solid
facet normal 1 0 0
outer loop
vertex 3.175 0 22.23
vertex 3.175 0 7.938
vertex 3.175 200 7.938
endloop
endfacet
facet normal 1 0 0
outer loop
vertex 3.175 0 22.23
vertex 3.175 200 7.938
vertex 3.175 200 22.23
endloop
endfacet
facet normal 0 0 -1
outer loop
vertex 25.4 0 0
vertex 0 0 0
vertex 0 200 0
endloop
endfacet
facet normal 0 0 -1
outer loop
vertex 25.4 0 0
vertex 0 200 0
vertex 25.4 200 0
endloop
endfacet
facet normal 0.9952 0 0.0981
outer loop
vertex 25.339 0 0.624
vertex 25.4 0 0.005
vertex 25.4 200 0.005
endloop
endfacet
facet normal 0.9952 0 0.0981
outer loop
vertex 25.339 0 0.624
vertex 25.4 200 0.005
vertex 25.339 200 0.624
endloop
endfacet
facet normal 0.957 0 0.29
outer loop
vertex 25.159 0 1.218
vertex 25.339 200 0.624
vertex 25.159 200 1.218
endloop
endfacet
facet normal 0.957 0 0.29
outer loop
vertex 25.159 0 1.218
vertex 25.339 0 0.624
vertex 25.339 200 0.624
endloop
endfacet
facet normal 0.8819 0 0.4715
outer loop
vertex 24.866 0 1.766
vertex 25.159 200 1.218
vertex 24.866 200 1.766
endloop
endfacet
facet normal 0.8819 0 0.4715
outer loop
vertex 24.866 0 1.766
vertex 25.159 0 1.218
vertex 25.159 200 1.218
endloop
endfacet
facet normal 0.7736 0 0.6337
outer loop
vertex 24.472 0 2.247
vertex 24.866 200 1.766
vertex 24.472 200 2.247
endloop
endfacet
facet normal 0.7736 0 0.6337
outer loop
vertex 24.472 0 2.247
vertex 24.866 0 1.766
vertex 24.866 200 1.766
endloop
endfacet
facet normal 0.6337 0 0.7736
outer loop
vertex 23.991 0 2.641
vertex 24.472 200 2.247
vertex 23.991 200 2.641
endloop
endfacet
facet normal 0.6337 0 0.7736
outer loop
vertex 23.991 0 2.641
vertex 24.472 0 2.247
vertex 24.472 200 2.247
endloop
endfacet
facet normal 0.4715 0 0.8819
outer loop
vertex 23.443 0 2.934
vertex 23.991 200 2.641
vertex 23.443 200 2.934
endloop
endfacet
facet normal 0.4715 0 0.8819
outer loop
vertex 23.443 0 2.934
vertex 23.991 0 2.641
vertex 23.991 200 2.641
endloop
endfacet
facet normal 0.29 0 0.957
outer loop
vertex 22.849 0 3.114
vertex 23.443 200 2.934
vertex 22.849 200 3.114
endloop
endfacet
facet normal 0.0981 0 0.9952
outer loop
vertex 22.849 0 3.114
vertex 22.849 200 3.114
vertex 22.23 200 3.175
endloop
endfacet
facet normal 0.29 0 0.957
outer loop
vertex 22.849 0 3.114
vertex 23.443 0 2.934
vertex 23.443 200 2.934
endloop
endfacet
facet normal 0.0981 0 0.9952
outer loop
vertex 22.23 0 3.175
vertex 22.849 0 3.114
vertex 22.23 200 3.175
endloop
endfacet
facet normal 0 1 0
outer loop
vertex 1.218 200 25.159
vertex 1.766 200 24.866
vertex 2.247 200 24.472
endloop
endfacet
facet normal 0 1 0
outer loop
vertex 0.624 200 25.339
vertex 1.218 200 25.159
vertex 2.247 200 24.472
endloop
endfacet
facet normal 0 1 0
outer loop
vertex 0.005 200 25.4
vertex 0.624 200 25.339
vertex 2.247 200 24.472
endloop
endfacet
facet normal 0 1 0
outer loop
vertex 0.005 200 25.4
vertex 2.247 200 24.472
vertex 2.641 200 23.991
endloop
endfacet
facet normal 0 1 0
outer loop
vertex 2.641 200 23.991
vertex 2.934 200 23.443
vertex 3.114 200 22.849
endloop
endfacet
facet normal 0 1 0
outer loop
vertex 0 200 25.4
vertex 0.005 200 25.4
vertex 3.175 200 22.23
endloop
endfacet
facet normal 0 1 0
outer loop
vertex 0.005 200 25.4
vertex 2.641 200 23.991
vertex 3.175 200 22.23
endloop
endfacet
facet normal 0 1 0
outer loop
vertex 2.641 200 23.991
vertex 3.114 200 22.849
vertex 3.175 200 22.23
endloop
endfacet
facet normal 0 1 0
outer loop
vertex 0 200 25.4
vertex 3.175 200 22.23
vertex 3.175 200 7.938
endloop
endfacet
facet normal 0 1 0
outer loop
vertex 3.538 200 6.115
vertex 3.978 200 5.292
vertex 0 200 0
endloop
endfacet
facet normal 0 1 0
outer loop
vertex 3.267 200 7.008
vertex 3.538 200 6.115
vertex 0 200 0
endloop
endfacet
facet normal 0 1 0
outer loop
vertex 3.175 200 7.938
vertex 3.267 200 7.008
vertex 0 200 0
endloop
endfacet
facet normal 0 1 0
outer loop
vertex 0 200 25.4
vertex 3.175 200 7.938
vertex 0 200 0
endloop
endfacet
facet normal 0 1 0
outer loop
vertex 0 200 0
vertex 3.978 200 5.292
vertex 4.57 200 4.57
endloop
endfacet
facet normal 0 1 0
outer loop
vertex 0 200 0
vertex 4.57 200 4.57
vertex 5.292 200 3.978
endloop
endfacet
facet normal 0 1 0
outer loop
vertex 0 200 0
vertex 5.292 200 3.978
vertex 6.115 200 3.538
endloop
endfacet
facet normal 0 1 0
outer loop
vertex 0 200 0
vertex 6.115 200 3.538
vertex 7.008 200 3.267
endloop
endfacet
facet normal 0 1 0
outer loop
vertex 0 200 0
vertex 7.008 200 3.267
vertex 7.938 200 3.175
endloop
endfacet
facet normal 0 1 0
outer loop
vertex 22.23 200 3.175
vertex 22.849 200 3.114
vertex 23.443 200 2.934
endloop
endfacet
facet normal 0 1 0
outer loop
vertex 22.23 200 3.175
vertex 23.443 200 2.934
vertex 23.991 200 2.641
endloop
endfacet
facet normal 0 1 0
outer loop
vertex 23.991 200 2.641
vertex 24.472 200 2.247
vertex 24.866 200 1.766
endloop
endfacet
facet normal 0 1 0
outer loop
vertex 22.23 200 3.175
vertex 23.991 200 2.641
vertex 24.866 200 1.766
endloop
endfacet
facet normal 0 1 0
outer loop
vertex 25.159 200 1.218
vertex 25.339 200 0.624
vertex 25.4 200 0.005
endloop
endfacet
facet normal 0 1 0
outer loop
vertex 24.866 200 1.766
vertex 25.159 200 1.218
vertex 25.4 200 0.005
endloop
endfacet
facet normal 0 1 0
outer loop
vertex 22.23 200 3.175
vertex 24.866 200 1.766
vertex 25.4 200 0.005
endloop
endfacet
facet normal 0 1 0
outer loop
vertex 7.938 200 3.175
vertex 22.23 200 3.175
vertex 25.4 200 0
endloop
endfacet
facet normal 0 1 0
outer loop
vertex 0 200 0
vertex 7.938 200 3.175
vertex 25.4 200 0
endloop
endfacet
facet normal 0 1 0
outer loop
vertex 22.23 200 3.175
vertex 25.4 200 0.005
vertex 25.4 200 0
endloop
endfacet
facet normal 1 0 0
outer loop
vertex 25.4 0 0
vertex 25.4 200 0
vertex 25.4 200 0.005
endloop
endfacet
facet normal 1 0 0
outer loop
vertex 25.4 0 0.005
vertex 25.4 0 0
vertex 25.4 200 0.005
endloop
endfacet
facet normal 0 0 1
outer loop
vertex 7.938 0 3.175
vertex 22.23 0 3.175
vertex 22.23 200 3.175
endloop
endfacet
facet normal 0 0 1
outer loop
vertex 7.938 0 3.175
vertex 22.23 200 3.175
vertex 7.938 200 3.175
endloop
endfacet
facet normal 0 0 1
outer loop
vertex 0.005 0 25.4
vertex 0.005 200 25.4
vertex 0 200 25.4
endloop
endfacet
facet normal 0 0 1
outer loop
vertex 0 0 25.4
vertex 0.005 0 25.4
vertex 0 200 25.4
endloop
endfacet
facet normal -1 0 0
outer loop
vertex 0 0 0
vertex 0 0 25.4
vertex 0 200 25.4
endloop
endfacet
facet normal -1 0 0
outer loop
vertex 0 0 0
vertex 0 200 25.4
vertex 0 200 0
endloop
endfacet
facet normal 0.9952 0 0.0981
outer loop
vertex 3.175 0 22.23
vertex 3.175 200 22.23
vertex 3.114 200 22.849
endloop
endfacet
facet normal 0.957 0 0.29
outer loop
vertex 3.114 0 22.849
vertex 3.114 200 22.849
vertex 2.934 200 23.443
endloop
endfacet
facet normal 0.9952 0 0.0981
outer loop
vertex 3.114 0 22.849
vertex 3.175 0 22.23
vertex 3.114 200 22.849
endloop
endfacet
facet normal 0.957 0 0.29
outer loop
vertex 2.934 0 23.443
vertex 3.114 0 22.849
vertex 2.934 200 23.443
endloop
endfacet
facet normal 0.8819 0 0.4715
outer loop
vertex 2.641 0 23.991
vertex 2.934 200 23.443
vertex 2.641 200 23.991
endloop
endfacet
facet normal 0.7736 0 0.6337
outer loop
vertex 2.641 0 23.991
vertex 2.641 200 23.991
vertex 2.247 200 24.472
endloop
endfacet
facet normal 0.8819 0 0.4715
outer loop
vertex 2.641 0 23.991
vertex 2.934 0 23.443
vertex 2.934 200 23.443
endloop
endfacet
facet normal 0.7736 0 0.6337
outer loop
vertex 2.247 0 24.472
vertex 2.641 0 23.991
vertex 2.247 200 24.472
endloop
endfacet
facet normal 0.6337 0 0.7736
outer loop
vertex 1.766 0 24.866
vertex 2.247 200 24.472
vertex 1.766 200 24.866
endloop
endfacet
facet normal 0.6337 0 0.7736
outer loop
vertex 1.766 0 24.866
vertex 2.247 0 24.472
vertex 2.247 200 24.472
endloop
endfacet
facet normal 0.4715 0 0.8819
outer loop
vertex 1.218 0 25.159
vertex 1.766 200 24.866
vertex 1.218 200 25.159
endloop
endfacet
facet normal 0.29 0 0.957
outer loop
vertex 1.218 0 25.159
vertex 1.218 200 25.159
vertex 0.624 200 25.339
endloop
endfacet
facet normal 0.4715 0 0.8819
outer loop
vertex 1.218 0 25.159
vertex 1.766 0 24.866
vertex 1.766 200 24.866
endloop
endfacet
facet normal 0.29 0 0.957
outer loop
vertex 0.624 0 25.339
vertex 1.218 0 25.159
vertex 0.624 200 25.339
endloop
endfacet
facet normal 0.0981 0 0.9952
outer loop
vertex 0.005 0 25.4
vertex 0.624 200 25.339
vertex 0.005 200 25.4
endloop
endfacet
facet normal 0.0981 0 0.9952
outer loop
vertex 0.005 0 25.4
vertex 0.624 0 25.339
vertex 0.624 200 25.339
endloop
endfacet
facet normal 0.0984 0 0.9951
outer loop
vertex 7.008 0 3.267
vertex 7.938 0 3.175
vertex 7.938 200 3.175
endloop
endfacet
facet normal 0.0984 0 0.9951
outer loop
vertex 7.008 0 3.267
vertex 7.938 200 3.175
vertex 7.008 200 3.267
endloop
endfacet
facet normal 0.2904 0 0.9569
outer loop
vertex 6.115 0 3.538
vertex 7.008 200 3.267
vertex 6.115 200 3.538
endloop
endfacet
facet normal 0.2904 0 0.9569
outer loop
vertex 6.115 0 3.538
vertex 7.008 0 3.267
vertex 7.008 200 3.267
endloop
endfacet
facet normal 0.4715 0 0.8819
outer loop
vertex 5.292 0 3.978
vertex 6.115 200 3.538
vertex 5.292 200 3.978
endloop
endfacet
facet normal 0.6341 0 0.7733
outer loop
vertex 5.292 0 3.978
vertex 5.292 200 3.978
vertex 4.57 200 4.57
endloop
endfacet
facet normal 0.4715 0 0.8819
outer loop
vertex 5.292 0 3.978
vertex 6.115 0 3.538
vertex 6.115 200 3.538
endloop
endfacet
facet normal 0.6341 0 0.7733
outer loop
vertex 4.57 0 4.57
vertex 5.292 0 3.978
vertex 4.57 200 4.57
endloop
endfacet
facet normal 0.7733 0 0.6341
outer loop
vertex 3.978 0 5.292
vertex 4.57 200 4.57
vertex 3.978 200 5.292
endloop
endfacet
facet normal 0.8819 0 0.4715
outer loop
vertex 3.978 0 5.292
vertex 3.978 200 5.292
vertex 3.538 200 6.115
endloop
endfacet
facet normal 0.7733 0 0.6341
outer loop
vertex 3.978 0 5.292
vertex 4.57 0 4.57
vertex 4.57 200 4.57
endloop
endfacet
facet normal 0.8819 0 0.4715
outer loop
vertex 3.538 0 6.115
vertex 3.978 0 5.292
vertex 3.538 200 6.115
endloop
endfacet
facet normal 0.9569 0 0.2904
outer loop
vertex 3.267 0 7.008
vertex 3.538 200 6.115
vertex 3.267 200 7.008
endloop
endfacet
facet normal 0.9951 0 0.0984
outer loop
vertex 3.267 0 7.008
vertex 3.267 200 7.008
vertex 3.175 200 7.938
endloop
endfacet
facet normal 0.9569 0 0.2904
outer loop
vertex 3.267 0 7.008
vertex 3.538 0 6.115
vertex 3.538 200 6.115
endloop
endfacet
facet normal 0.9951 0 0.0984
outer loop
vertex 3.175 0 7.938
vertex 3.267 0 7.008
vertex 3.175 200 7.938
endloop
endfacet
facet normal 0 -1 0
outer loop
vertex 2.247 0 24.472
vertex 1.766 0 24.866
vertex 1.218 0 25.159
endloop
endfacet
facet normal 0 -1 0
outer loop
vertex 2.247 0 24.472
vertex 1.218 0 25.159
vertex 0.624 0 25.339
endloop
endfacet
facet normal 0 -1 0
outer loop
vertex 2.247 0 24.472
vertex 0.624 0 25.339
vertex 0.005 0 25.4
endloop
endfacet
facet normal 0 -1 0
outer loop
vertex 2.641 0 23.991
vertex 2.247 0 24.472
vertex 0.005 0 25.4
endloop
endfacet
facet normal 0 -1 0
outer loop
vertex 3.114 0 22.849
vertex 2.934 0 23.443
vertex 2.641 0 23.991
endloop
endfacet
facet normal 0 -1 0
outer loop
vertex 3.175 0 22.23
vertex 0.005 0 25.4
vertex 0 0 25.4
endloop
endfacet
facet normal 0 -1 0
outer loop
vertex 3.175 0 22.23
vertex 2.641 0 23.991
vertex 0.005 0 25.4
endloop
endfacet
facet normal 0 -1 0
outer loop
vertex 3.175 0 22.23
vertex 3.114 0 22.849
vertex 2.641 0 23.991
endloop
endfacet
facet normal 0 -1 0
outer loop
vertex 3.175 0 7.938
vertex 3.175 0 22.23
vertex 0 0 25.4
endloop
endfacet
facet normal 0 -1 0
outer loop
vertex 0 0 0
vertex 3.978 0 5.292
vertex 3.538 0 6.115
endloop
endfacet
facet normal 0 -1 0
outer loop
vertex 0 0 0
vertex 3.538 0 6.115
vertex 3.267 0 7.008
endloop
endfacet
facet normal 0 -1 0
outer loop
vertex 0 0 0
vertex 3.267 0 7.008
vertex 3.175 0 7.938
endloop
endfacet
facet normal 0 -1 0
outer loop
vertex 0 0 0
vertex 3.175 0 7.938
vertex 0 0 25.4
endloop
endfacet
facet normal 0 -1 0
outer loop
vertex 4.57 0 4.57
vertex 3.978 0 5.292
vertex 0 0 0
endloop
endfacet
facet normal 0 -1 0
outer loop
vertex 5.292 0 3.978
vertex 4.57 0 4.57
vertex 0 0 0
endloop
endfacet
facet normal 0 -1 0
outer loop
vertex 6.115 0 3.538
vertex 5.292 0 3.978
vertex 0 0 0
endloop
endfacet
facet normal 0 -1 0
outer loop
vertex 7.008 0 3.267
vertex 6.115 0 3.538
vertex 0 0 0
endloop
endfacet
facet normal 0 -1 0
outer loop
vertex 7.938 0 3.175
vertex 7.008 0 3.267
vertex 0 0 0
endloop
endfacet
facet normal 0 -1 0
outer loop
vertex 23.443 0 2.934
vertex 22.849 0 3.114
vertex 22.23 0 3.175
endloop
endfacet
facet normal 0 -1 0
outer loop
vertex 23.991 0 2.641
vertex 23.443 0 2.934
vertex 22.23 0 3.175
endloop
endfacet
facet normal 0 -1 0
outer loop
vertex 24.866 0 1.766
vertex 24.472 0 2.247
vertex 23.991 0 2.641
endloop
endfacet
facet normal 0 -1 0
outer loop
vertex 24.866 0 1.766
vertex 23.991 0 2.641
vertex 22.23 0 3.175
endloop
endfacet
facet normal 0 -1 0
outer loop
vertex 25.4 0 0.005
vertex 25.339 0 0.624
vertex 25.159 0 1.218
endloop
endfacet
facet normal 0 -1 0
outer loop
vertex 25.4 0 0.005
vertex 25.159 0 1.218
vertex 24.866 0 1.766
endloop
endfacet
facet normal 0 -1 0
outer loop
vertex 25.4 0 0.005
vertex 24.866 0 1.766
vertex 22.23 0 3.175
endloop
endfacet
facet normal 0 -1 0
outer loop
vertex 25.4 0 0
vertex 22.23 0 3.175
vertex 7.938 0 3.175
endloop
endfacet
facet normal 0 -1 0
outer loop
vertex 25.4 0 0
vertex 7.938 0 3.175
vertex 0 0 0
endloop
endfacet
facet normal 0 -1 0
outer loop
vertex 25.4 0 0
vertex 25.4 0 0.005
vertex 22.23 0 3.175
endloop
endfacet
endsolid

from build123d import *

# Parameters (mm, degrees)
HIERRO_ANGULAR_1_X_1_X_0_125_1_DEPTH = 200


with BuildPart() as part:
    # Sketch1 → Hierro angular 1 X 1 X 0.125(1) (new body)
    with BuildSketch(Plane.ZX):
        with BuildLine():
            Line((0, 0), (0, 25.4))
            Line((0, 25.4), (0.00508, 25.4))
            ThreePointArc((0.00508, 25.4), (2.246551928, 24.471551928), (3.175, 22.23008))
            Line((3.175, 22.23008), (3.175, 7.9375))
            ThreePointArc((3.175, 7.9375), (4.569903955, 4.569903955), (7.9375, 3.175))
            Line((7.9375, 3.175), (22.23008, 3.175))
            ThreePointArc((22.23008, 3.175), (24.471551928, 2.246551928), (25.4, 0.00508))
            Line((25.4, 0.00508), (25.4, 0))
            Line((25.4, 0), (0, 0))
        make_face()
    extrude(amount=HIERRO_ANGULAR_1_X_1_X_0_125_1_DEPTH)


solid = part.part
